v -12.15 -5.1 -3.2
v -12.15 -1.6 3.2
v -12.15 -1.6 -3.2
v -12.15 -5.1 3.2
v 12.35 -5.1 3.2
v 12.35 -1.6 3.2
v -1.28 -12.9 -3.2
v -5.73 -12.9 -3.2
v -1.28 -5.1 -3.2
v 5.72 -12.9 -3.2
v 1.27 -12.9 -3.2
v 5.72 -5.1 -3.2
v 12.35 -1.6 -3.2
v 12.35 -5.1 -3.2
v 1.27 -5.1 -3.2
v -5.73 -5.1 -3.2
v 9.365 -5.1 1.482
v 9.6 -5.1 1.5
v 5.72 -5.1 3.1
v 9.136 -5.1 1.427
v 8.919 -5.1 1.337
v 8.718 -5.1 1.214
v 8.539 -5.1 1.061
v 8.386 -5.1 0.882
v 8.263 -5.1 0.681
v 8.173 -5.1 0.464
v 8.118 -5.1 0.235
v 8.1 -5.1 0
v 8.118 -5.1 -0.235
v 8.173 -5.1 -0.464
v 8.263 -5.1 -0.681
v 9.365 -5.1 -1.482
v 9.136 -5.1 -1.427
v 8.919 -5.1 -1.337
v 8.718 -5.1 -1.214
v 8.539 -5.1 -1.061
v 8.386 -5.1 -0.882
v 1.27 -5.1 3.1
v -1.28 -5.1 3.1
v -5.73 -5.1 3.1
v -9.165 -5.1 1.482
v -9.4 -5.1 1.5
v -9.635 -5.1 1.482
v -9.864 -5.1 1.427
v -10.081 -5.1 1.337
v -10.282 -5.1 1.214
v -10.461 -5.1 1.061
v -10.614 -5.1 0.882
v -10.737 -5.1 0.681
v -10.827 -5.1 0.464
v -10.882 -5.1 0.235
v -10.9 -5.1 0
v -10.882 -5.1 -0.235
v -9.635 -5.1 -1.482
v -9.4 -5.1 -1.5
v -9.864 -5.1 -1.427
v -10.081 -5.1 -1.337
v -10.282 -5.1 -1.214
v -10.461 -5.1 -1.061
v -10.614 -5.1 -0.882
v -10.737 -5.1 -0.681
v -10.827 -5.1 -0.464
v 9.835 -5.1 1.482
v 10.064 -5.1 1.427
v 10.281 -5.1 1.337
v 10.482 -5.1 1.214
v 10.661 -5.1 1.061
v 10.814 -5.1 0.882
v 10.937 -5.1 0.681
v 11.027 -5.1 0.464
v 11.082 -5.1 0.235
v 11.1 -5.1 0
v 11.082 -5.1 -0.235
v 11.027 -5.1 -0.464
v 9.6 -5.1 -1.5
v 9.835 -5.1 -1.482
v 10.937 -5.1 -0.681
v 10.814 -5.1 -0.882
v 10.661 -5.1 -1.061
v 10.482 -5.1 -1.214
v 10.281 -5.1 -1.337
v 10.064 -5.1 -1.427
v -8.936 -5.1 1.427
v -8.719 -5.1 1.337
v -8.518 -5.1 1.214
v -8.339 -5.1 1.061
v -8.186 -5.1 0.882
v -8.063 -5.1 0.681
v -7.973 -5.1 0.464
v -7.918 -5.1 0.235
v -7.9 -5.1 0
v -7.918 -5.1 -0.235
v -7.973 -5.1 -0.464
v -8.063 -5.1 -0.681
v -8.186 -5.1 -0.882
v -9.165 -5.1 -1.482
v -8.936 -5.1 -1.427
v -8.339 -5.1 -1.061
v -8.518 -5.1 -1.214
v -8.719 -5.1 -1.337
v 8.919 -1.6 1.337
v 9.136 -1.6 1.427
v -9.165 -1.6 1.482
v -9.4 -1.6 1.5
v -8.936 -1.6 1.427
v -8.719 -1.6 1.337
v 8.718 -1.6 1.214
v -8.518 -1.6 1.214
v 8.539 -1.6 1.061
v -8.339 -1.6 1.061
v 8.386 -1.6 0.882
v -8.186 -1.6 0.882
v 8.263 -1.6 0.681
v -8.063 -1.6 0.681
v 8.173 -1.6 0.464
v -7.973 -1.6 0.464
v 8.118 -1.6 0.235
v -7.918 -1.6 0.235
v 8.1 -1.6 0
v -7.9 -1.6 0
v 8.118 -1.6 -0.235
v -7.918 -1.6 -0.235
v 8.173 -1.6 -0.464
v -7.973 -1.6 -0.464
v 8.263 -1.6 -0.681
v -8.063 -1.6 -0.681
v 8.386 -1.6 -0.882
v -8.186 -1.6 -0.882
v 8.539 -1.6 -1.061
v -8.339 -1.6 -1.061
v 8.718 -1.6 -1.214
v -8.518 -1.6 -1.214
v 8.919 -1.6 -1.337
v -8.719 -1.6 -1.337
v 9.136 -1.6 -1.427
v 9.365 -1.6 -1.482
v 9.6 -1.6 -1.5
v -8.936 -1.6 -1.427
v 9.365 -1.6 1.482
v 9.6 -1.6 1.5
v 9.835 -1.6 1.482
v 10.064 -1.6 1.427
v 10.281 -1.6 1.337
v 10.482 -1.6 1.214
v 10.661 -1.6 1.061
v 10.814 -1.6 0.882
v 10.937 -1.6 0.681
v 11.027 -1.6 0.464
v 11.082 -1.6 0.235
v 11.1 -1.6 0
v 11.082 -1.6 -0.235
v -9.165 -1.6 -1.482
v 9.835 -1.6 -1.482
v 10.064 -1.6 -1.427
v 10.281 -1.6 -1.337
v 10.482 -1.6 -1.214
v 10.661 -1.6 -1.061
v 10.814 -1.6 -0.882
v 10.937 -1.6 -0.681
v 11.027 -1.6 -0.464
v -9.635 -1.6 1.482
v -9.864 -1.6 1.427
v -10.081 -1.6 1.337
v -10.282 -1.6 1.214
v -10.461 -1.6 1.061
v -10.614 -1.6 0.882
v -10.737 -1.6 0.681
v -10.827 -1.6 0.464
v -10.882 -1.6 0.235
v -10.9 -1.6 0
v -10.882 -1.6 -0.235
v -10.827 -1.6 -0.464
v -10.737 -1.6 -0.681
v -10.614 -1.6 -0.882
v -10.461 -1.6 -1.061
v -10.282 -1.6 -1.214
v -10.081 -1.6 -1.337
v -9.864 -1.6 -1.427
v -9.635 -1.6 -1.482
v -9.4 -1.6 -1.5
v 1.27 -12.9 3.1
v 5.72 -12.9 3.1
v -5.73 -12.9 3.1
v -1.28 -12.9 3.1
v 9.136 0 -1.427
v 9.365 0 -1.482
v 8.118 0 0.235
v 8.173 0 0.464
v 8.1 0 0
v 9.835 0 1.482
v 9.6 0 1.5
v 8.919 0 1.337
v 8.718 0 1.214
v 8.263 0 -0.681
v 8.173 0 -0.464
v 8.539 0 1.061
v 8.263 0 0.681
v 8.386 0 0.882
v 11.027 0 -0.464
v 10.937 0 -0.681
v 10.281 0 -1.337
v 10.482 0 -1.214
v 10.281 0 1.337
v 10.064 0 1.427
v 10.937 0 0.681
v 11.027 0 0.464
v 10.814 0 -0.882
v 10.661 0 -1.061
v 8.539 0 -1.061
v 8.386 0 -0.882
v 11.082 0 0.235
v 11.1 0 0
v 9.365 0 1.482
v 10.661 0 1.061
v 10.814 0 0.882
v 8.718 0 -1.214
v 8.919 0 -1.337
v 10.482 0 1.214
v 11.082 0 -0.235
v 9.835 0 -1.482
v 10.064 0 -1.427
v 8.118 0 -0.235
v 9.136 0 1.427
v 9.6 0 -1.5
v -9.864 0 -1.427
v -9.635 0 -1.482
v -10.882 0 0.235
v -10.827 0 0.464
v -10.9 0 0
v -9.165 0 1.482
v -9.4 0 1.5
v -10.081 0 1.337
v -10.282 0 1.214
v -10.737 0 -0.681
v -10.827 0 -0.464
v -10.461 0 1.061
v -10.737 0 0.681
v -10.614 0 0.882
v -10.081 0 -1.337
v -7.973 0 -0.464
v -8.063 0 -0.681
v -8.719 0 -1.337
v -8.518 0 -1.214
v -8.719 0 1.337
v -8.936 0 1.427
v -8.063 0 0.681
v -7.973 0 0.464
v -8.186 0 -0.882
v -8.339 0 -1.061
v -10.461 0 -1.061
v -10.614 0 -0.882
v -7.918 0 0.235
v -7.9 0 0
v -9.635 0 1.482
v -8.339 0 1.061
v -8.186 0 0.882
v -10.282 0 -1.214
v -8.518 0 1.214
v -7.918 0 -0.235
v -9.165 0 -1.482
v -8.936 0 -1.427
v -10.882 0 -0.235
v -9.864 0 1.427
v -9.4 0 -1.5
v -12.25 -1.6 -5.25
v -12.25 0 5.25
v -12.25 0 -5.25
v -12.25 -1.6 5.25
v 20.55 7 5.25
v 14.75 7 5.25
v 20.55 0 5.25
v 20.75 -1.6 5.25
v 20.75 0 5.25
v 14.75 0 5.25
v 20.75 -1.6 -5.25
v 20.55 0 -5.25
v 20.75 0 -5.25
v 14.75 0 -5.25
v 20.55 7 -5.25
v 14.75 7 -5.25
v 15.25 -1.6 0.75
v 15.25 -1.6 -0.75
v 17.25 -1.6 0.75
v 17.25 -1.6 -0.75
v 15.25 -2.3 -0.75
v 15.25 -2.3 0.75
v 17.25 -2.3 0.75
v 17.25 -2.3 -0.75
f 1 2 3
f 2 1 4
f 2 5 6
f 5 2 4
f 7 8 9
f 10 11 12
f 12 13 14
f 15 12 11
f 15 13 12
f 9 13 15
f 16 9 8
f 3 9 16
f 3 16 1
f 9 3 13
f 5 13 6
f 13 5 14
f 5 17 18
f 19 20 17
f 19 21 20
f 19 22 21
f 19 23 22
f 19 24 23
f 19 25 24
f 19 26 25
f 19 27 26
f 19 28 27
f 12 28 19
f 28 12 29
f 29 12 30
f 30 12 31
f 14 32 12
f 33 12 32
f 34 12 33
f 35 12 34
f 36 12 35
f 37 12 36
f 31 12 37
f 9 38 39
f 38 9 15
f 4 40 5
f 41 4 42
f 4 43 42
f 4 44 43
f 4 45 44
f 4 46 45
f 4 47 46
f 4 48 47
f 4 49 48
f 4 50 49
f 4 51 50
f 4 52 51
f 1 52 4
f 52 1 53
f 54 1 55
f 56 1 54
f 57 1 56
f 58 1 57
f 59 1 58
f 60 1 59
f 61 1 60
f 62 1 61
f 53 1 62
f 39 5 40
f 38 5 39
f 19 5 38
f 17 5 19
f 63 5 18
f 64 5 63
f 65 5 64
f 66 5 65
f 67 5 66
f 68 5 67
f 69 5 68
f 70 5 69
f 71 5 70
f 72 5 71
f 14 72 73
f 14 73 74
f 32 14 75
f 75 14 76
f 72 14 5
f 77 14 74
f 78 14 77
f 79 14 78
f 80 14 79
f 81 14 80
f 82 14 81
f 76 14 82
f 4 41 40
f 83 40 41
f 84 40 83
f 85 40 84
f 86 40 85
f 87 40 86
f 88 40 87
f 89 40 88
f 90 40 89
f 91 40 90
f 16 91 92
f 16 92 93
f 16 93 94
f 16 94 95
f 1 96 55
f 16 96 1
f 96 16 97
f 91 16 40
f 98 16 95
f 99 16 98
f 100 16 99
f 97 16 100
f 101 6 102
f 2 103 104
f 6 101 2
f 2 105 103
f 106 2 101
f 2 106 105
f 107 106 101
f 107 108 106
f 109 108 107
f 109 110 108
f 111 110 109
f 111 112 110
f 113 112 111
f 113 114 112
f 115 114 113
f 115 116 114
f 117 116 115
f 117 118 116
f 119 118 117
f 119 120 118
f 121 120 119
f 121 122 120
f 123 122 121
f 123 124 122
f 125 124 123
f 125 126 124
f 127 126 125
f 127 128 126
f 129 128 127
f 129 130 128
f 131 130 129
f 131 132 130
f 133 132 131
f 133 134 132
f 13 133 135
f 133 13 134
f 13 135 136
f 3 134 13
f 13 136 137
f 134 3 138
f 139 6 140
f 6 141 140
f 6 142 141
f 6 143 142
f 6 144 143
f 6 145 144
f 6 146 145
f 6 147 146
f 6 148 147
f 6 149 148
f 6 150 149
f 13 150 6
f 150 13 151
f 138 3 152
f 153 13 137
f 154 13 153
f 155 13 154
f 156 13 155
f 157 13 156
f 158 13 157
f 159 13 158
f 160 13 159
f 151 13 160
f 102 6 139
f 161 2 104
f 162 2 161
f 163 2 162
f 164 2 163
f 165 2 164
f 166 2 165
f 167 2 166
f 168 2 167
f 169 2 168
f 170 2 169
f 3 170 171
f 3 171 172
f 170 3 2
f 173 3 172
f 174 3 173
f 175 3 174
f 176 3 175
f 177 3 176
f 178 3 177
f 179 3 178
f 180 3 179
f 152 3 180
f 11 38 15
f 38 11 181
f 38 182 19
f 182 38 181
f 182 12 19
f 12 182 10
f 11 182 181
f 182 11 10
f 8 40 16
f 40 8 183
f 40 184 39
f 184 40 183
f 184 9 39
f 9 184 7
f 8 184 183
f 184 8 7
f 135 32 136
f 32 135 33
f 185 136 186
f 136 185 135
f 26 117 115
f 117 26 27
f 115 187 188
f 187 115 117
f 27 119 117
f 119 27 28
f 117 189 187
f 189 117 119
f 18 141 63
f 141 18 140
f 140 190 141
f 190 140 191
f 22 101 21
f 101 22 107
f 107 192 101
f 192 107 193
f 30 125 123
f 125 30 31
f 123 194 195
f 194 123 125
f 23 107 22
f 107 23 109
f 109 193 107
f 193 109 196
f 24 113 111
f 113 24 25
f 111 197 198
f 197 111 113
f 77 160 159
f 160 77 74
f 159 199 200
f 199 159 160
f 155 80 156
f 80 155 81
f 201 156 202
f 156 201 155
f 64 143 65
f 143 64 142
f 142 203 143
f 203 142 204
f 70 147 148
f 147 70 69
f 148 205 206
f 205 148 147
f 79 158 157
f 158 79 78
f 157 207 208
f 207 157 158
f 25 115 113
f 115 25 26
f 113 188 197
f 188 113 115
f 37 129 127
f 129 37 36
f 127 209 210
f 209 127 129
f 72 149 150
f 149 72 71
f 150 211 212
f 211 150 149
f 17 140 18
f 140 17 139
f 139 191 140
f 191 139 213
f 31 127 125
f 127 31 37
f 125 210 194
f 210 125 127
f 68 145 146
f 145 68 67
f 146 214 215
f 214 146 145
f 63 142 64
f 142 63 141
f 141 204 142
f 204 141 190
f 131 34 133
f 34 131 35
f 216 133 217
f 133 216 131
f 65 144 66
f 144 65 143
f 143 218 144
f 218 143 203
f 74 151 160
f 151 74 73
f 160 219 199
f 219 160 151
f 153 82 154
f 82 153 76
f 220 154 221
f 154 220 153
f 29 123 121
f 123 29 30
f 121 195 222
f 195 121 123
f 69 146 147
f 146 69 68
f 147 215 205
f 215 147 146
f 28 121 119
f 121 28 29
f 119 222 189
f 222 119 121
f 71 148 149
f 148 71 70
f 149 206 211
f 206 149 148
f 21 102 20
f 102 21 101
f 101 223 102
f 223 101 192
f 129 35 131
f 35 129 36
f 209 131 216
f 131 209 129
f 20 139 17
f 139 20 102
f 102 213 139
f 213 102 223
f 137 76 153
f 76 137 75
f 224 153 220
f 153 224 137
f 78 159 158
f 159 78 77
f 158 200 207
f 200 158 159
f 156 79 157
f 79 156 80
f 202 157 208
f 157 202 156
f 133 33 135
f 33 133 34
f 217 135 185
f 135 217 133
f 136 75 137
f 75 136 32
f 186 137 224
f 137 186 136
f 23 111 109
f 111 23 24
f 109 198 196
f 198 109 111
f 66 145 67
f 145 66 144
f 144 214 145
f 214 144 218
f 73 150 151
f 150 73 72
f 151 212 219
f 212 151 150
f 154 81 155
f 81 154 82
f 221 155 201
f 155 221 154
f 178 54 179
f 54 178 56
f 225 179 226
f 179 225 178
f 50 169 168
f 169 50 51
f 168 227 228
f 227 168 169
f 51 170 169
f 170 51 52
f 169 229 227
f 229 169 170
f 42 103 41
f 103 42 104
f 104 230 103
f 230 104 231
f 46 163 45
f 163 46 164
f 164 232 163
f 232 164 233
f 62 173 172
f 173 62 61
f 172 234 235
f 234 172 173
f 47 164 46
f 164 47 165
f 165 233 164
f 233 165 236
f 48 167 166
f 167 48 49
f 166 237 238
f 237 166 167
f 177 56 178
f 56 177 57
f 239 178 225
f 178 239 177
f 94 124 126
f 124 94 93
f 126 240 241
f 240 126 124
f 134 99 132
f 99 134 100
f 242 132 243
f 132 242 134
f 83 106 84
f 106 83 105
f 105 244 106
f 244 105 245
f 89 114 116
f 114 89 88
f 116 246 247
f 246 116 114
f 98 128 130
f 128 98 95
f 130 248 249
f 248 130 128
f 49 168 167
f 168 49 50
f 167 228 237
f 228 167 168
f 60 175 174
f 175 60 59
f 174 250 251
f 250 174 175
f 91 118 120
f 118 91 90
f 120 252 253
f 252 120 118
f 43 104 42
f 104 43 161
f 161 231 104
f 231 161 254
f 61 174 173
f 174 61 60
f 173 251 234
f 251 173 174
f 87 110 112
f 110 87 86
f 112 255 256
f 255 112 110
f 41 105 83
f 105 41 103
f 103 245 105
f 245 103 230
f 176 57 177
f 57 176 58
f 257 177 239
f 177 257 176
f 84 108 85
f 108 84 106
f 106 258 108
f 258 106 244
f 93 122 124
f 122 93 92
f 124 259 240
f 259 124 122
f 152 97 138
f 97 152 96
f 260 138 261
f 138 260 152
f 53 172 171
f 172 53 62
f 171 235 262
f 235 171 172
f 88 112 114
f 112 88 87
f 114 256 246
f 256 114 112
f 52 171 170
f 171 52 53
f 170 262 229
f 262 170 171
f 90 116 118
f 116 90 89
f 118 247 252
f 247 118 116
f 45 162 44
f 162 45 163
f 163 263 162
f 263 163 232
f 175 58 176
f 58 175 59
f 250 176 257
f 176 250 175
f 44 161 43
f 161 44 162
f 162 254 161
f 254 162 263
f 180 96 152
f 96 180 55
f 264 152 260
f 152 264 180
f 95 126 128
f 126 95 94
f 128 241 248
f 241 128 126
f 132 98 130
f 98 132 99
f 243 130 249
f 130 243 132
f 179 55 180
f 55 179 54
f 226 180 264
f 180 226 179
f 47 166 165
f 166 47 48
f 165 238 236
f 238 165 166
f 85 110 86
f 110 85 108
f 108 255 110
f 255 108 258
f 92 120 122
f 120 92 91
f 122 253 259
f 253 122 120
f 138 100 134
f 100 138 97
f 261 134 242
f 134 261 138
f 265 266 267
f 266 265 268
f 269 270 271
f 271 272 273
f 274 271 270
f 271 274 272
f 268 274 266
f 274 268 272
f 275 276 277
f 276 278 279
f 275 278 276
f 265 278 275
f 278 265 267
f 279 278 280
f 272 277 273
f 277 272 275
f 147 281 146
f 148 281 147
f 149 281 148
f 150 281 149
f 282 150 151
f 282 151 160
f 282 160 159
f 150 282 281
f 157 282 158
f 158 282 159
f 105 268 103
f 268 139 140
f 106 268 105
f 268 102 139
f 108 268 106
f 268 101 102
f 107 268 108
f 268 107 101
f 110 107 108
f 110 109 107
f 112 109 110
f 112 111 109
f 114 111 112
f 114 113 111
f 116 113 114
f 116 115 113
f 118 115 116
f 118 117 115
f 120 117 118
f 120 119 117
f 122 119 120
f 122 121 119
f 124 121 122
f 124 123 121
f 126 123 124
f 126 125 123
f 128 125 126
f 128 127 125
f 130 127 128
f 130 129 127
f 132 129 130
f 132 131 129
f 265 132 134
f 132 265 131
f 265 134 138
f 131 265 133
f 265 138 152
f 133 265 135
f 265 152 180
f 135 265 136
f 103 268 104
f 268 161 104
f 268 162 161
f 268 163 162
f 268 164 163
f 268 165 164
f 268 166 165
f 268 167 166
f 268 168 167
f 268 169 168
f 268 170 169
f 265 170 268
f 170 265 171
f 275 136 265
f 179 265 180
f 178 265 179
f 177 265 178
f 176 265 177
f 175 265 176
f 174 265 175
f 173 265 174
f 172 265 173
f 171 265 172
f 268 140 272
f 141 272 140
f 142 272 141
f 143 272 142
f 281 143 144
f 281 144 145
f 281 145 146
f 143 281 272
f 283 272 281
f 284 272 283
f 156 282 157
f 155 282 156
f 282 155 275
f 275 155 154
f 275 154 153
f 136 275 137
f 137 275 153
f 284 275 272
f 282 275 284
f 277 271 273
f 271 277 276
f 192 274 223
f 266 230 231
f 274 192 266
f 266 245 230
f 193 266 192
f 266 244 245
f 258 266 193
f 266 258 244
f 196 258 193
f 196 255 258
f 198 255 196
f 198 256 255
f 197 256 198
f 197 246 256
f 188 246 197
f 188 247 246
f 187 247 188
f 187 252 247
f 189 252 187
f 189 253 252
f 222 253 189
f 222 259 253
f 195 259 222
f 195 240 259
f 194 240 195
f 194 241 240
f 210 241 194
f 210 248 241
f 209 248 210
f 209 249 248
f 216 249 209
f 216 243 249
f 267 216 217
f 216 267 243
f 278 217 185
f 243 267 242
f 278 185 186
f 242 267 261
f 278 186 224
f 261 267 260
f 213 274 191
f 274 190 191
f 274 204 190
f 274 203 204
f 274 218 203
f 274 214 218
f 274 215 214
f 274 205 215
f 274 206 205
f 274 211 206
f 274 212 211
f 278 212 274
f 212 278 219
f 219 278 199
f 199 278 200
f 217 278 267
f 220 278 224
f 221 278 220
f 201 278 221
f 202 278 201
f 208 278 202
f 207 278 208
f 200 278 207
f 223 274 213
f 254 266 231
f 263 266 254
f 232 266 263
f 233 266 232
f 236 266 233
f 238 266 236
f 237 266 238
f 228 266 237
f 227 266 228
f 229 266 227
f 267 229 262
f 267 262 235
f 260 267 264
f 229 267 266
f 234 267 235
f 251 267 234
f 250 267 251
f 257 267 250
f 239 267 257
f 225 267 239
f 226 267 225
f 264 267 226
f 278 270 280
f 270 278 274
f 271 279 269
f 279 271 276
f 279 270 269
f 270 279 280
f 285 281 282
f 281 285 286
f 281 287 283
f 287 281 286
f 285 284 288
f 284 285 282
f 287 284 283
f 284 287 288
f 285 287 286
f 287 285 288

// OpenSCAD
translate([20.75,0,-5.25])
    rotate ([0,0,180])
        opto_endstop();


module opto_endstop(){
 difference(){
  union(){
  // base PCB
   color("green") cube([33.0,1.6,10.5]);
  // add the switch module
   translate([8.4,1.6,10.5/2-6.4/2]) optoswitch();
   // connector
   translate([0.2,-7,0]) color("white") cube([5.8,7,10.5]);
   // led
   translate([3.5,1.6,10.5/2-1.5/2]) color("red") cube([2,0.7,1.5]);
  }
   translate([8.4,0,10.5/2-6.4/2]) {
   for ( hole = [2.75,24.5-2.75] ){
    rotate([90,0,0]) translate([hole,6.4/2,-4]) cylinder(r=1.5, h=4.5,$fn=40);
   }
  }
 }
}

// switch module
module optoswitch() {
 difference(){
  union (){
   color("gray") cube([24.5,3.5,6.4]);
   color("gray")translate([6.63,0,0]) cube([4.45,11.3,6.3]);
   color("gray")translate([13.63,0,0]) cube([4.45,11.3,6.3]);
  }
   for ( hole = [2.75,24.5-2.75] ){
 	rotate([90,0,0]) translate([hole,6.4/2,-4]) cylinder(r=1.5, h=4.5,$fn=40);
   }
 }
}
